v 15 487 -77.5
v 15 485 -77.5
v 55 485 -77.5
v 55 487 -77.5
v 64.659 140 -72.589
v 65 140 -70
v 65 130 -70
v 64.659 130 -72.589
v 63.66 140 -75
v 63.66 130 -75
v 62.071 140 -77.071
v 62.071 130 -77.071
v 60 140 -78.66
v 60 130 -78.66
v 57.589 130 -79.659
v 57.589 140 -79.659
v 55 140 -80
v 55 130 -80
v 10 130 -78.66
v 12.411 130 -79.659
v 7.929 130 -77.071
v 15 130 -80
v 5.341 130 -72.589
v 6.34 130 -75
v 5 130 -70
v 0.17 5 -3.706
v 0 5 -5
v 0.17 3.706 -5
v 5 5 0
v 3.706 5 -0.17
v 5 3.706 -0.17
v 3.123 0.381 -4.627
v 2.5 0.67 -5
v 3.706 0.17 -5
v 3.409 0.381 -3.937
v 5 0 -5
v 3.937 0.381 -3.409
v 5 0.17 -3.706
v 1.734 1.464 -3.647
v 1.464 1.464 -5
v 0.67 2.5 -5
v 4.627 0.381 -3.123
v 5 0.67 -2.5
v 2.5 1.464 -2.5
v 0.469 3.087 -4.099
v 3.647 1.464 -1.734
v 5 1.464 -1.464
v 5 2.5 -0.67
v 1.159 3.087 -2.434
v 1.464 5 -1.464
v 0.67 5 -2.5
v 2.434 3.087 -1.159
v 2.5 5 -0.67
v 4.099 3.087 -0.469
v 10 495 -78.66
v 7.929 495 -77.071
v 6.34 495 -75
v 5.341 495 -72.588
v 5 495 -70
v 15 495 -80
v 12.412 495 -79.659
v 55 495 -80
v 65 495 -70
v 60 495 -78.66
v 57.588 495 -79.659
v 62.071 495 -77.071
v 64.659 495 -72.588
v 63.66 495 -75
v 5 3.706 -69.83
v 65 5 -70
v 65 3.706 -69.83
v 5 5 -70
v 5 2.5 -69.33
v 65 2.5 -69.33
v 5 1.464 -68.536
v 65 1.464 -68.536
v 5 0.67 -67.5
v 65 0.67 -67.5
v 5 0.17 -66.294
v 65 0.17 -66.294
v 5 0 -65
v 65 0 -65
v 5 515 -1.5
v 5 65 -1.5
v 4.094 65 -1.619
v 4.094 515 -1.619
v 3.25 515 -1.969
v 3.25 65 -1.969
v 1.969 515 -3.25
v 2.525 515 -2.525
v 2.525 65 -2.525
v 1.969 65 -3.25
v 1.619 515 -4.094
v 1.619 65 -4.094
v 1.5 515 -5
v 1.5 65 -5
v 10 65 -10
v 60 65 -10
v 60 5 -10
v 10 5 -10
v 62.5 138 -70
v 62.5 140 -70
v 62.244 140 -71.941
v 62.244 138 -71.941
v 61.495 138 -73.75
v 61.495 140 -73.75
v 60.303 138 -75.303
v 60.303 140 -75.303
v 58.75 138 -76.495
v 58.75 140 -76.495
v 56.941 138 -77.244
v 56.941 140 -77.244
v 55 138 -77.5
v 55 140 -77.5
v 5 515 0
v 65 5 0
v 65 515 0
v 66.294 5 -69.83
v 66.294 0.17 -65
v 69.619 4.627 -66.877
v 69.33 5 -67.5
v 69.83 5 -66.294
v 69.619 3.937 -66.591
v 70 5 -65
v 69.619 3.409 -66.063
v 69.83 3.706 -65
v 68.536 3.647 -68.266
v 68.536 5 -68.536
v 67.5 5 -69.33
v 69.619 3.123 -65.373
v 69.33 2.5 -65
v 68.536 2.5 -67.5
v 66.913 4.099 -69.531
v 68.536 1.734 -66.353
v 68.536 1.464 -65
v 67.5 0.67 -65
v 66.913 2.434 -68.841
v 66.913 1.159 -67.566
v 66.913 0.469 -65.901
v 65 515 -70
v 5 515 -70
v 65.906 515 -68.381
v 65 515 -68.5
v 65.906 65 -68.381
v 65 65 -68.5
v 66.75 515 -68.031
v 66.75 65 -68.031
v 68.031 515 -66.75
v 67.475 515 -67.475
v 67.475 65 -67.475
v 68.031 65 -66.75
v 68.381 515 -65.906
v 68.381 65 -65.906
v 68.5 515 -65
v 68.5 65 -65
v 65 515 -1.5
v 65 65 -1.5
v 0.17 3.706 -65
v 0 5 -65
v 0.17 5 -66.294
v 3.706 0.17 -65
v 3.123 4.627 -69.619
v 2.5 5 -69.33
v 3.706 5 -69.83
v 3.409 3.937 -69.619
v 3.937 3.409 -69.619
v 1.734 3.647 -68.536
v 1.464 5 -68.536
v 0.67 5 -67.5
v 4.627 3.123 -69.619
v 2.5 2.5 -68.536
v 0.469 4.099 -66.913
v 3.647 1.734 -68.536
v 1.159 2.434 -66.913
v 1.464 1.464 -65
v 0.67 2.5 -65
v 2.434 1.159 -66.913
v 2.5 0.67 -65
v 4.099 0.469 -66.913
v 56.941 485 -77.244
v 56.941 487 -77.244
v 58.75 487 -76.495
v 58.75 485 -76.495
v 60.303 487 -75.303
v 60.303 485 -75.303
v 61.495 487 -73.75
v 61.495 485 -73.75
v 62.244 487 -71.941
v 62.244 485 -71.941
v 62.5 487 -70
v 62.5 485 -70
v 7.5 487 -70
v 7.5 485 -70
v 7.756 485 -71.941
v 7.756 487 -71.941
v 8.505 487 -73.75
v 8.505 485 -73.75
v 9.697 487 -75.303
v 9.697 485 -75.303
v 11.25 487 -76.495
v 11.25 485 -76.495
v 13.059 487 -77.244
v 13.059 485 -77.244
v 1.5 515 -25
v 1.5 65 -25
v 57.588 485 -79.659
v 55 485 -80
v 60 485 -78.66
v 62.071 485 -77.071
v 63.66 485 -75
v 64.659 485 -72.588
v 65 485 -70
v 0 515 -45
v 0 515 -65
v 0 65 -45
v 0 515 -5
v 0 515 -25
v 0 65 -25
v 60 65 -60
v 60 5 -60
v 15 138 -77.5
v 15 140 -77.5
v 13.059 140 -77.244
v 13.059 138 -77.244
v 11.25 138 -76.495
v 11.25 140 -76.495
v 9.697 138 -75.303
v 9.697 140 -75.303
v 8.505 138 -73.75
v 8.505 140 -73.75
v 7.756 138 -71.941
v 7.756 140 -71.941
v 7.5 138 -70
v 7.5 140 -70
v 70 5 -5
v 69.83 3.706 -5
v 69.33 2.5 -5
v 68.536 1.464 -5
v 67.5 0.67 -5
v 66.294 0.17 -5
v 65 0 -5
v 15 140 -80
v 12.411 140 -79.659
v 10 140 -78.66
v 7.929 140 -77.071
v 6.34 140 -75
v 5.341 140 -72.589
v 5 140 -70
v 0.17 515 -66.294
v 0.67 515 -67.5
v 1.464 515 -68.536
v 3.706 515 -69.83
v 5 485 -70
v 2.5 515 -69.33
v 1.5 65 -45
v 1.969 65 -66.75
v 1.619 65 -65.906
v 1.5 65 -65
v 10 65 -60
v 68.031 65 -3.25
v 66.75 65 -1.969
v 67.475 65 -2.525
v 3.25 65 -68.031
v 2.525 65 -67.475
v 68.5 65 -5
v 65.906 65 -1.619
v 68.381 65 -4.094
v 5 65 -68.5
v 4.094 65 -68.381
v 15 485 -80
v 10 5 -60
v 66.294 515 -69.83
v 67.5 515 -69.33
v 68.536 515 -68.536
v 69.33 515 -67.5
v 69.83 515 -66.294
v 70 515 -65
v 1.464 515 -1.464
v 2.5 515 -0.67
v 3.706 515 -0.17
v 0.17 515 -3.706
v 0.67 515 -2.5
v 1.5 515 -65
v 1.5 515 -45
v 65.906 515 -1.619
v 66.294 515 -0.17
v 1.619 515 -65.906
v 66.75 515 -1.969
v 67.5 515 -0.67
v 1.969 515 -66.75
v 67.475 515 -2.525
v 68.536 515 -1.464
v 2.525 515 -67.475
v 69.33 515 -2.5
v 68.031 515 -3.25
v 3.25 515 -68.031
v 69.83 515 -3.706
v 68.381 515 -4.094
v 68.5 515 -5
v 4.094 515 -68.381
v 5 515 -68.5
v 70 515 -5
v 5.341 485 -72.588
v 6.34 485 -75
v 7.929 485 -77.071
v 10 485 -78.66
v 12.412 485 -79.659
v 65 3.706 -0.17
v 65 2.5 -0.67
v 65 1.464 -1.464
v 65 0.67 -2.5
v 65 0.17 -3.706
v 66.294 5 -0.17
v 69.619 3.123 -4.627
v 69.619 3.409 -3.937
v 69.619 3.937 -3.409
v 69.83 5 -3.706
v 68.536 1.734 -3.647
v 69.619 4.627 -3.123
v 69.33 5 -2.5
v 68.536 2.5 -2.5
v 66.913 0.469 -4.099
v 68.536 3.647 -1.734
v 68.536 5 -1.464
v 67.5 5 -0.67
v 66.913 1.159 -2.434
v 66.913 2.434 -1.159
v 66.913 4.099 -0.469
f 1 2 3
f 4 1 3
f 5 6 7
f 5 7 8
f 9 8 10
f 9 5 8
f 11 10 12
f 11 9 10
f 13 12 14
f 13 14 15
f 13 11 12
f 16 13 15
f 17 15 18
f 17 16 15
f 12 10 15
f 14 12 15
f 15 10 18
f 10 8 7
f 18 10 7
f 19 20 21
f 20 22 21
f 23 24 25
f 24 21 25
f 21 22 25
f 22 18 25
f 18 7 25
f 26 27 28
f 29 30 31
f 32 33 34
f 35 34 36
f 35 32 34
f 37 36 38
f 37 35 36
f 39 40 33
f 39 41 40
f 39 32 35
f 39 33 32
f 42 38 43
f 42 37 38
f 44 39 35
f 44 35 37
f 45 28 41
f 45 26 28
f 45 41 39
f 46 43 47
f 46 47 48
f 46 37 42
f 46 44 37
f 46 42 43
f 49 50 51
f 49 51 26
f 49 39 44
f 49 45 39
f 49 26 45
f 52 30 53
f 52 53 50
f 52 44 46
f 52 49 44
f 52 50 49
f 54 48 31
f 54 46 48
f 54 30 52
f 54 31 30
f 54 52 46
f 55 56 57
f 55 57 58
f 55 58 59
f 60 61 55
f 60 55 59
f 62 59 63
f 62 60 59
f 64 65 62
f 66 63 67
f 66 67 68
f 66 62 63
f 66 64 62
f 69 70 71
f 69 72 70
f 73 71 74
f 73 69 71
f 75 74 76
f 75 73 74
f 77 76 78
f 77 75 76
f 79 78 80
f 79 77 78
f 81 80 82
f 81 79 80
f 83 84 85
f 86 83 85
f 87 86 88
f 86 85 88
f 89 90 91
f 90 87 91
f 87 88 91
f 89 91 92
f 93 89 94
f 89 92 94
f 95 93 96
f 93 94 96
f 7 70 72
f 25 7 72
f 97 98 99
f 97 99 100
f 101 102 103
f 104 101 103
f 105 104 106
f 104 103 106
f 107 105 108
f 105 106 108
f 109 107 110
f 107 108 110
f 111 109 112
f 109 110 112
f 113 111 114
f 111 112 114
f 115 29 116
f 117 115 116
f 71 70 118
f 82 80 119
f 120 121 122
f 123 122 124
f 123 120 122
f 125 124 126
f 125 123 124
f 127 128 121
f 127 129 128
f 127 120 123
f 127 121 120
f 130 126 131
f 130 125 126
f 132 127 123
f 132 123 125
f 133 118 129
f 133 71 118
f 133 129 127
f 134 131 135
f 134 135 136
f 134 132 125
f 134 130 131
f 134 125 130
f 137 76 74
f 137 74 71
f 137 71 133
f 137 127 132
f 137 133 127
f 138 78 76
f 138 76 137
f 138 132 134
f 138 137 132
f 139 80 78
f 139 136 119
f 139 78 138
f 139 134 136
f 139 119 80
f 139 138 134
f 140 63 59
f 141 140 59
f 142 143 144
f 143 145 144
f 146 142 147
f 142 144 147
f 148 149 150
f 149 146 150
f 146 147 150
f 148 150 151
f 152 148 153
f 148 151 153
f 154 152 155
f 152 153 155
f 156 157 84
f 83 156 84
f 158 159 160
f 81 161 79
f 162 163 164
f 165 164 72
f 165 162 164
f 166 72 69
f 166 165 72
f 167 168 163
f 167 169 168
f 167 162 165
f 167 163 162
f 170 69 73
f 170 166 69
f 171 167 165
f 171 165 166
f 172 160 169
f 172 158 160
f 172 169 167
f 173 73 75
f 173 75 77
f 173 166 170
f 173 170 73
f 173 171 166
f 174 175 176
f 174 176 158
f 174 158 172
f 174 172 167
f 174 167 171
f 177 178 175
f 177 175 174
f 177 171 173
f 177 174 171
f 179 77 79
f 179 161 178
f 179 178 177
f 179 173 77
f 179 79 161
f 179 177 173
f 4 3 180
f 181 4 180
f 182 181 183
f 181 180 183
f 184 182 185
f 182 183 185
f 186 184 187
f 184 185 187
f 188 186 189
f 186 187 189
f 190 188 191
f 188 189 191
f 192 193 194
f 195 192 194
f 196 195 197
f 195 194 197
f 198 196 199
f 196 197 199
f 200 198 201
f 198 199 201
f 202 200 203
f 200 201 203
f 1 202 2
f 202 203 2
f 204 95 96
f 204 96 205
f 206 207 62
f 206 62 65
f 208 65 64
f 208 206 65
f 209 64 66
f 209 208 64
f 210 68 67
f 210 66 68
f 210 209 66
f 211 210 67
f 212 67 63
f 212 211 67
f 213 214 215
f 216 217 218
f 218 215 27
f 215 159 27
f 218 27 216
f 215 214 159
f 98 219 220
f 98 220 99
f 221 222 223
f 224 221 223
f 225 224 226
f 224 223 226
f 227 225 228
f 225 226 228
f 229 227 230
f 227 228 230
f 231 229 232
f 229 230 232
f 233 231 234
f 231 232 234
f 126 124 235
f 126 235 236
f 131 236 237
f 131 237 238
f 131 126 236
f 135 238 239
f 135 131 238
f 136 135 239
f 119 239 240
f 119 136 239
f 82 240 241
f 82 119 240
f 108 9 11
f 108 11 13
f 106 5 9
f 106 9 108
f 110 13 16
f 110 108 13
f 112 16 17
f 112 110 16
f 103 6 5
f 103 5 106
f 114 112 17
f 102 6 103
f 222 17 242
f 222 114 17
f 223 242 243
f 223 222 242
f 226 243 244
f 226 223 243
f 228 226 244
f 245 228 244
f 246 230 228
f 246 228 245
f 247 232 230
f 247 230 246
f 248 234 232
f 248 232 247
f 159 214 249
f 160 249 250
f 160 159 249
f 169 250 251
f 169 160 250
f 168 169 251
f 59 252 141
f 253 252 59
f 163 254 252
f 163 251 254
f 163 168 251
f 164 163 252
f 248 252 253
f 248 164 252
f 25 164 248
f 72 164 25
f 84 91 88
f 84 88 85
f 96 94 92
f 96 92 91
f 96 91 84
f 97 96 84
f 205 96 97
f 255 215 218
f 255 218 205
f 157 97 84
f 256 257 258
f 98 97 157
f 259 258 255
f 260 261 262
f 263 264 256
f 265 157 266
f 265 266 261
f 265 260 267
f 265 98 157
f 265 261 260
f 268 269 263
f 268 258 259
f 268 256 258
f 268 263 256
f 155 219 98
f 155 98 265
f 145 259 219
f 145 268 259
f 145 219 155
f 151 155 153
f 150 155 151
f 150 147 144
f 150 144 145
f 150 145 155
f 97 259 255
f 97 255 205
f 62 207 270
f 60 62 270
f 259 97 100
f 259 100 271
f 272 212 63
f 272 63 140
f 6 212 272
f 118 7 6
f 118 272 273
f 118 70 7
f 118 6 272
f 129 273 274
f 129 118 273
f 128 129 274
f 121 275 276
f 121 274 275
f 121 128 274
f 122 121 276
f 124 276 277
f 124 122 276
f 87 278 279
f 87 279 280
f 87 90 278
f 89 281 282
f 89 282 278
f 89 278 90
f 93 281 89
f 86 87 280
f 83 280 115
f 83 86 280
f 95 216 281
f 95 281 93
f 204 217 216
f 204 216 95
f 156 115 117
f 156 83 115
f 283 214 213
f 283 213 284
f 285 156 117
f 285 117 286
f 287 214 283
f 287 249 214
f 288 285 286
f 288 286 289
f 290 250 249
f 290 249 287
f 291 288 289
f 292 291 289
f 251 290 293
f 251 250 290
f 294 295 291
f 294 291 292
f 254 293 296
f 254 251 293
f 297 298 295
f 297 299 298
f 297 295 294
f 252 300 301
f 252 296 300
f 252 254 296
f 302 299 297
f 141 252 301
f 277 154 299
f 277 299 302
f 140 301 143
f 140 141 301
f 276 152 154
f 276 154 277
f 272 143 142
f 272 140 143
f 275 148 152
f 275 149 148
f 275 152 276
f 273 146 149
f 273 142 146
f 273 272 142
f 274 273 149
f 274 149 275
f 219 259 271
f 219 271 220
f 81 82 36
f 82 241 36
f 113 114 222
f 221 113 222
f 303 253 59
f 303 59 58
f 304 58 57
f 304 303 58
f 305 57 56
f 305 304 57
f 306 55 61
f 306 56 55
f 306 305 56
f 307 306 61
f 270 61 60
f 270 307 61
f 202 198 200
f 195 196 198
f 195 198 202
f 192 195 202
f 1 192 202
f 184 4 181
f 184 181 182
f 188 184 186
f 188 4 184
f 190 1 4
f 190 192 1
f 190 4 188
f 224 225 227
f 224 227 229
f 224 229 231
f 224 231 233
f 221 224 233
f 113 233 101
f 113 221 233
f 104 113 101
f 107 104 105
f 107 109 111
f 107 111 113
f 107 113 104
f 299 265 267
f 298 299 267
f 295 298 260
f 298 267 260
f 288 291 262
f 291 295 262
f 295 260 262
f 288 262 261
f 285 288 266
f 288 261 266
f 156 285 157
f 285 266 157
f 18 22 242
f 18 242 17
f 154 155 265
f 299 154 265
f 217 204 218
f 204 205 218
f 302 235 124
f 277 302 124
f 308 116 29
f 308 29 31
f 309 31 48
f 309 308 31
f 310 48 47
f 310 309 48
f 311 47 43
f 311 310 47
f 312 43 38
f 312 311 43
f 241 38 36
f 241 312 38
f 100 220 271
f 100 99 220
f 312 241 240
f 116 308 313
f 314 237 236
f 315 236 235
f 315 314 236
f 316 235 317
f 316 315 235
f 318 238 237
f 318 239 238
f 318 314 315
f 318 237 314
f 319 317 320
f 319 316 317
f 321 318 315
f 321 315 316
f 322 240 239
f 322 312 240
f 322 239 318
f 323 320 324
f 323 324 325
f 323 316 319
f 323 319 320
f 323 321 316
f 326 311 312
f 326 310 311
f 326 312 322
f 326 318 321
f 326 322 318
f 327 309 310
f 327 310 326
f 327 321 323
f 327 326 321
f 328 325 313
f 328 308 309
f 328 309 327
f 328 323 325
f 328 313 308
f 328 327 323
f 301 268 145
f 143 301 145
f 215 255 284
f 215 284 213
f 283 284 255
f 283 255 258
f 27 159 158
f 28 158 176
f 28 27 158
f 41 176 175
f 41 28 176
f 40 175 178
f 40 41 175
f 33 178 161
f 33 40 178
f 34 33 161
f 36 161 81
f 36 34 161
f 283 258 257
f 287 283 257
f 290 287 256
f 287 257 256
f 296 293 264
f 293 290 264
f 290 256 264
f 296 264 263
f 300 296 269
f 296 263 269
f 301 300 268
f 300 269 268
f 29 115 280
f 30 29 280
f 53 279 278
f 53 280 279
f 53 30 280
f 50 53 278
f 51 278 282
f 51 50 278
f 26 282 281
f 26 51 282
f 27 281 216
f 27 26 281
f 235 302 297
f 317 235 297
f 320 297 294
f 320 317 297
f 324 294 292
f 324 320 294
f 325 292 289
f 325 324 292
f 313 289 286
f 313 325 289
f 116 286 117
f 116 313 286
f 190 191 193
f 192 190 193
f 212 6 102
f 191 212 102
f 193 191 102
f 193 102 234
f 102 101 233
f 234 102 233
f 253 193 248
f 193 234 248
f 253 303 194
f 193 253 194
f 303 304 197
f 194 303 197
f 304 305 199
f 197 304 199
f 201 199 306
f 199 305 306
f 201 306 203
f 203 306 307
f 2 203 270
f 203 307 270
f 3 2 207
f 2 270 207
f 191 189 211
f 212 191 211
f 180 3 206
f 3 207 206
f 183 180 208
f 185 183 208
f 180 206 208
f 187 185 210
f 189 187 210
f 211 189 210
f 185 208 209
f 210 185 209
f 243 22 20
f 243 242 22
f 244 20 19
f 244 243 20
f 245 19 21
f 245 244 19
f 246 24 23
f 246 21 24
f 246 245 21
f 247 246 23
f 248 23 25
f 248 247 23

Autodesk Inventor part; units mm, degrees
ref_plane "YZ Plane" through (0, 0, 0) normal (1, 0, 0) x (0, 1, 0)
ref_plane "XY Plane" through (0, 0, 0) normal (0, 0, 1) x (1, 0, 0)
sketch "草图1" plane through (0, 0, 0) normal (0, 1, 0) x (-1, 0, 0)
  line L0 (0, 0) -> (-70, 0)
  line L1 (-70, 0) -> (-70, -70)
  line L2 (-70, -70) -> (0, -70)
  line L3 (0, -70) -> (0, 0)
  dimension "d0" = 70
  dimension "d1" = 70
extrude "拉伸1" add sketch "草图1" along normal blind 5
sketch "草图2" plane through (0, 5, 0) normal (0, 1, 0) x (1, 0, 0)
  line L0 (0, 70) -> (0, 0) projected
  line L1 (70, 70) -> (0, 70) projected
  line L2 (0, 0) -> (70, 0)
  line L3 (70, 0) -> (70, 70)
  line L4 (70, 70) -> (0, 70)
  line L5 (0, 70) -> (0, 0)
  line L6 (60, 60) -> (60, 10)
  line L7 (60, 10) -> (10, 10)
  line L8 (10, 10) -> (10, 60)
  line L9 (10, 60) -> (60, 60)
  dimension "d4" = 10
extrude "拉伸2" add sketch "草图2" along normal blind 60
fillet "圆角1" radius 5 8 edges at (0, 32.5, 0) (35, 0, 0) (0, 0, -35) (35, 0, -70) (70, 0, -35) (70, 32.5, -70) (70, 32.5, 0) (0, 32.5, -70)
sketch "草图3" plane through (0, 65, 0) normal (0, 1, 0) x (1, 0, 0)
  arc A0 (0, 5) -> (5, 0) centre (5, 5) ccw projected
  line L0 (5, 0) -> (65, 0) projected
  arc A1 (65, 0) -> (70, 5) centre (65, 5) ccw projected
  line L1 (70, 5) -> (70, 65) projected
  arc A2 (70, 65) -> (65, 70) centre (65, 65) ccw projected
  line L2 (65, 70) -> (5, 70) projected
  arc A3 (5, 70) -> (0, 65) centre (5, 65) ccw projected
  line L3 (0, 65) -> (0, 5) projected
  line L4 (60, 60) -> (60, 10) projected
  line L5 (60, 10) -> (10, 10) projected
  line L6 (10, 10) -> (10, 60) projected
  line L7 (10, 60) -> (60, 60) projected
  line L8 (68.5, 65) -> (68.5, 5)
  arc A4 (65, 1.5) -> (68.5, 5) centre (65, 5) ccw
  line L9 (65, 1.5) -> (5, 1.5)
  arc A5 (1.5, 5) -> (5, 1.5) centre (5, 5) ccw
  line L10 (1.5, 5) -> (1.5, 65)
  arc A6 (5, 68.5) -> (1.5, 65) centre (5, 65) ccw
  line L11 (5, 68.5) -> (65, 68.5)
  arc A7 (68.5, 65) -> (65, 68.5) centre (65, 65) ccw
  line L12 (1.5, 45) -> (0, 45)
  line L13 (0, 65) -> (0, 5) projected
  line L14 (1.5, 25) -> (0, 25)
  point P0 (0, 0)
  dimension "d8" = 1.5
  dimension "d9" = 25
  dimension "d10" = 25
extrude "拉伸3" add sketch "草图3" along normal blind 450 contours L3 L14 L10 A5 L9 A4 L8 A7 L11 A6 L12 A3 L2 A2 L1 A1 L0 A0
ref_plane "工作平面1" through (0, 130, 0) normal (0, 1, 0) x (-1, 0, 0)
sketch "草图5" plane through (0, 130, 0) normal (0, 1, 0) x (-1, 0, 0)
  arc A0 (-70, -65) -> (-65, -70) centre (-65, -65) ccw projected
  line L0 (-65, -70) -> (-5, -70)
  line L1 (-5, -70) -> (-5, -80)
  line L2 (-5, -80) -> (-65, -80)
  line L3 (-65, -80) -> (-65, -70)
  point P0 (0, 0)
  dimension "d18" = 10
extrude "拉伸4" add sketch "草图5" along normal blind 10
fillet "圆角2" radius 10 2 edges at (65, 135, -80) (5, 135, -80)
sketch "草图6" plane through (0, 140, 0) normal (0, 1, 0) x (1, 0, 0)
  point P0 (0, 0)
sketch "草图7" plane through (0, 140, 0) normal (0, 1, 0) x (1, 0, 0)
  arc A0 (65, 70) -> (55, 80) centre (55, 70) ccw projected
  line L0 (55, 80) -> (15, 80) projected
  arc A1 (15, 80) -> (5, 70) centre (15, 70) ccw projected
  arc A2 (62.5, 70) -> (55, 77.5) centre (55, 70) ccw
  line L1 (55, 77.5) -> (15, 77.5)
  arc A3 (15, 77.5) -> (7.5, 70) centre (15, 70) ccw
  line L2 (62.5, 70) -> (7.5, 70)
  line L3 (60, 10) -> (60, 60) projected
  point P0 (0, 0)
  dimension "d22" = 2.5
extrude "拉伸5" cut sketch "草图7" against normal blind 2
ref_plane "工作平面2" through (0, 485, 0) normal (0, 1, 0) x (1, 0, 0)
sketch "草图8" plane through (0, 485, 0) normal (0, 1, 0) x (1, 0, 0)
  arc A0 (15, 80) -> (5, 70) centre (15, 70) ccw projected
  line L0 (55, 80) -> (15, 80) projected
  arc A1 (65, 70) -> (55, 80) centre (55, 70) ccw projected
  line L1 (5, 70) -> (65, 70) projected
  point P0 (0, 0)
extrude "拉伸6" add sketch "草图8" along normal blind 10
sketch "草图9" plane through (0, 485, 0) normal (0, -1, 0) x (1, 0, 0)
  line L0 (15, -77.5) -> (55, -77.5) projected
  arc A0 (7.5, -70) -> (15, -77.5) centre (15, -70) ccw projected
  line L1 (62.5, -70) -> (7.5, -70) projected
  arc A1 (55, -77.5) -> (62.5, -70) centre (55, -70) ccw projected
  point P0 (0, 0)
extrude "拉伸7" cut sketch "草图9" against normal blind 2
properties part number "龙门架柱1"
